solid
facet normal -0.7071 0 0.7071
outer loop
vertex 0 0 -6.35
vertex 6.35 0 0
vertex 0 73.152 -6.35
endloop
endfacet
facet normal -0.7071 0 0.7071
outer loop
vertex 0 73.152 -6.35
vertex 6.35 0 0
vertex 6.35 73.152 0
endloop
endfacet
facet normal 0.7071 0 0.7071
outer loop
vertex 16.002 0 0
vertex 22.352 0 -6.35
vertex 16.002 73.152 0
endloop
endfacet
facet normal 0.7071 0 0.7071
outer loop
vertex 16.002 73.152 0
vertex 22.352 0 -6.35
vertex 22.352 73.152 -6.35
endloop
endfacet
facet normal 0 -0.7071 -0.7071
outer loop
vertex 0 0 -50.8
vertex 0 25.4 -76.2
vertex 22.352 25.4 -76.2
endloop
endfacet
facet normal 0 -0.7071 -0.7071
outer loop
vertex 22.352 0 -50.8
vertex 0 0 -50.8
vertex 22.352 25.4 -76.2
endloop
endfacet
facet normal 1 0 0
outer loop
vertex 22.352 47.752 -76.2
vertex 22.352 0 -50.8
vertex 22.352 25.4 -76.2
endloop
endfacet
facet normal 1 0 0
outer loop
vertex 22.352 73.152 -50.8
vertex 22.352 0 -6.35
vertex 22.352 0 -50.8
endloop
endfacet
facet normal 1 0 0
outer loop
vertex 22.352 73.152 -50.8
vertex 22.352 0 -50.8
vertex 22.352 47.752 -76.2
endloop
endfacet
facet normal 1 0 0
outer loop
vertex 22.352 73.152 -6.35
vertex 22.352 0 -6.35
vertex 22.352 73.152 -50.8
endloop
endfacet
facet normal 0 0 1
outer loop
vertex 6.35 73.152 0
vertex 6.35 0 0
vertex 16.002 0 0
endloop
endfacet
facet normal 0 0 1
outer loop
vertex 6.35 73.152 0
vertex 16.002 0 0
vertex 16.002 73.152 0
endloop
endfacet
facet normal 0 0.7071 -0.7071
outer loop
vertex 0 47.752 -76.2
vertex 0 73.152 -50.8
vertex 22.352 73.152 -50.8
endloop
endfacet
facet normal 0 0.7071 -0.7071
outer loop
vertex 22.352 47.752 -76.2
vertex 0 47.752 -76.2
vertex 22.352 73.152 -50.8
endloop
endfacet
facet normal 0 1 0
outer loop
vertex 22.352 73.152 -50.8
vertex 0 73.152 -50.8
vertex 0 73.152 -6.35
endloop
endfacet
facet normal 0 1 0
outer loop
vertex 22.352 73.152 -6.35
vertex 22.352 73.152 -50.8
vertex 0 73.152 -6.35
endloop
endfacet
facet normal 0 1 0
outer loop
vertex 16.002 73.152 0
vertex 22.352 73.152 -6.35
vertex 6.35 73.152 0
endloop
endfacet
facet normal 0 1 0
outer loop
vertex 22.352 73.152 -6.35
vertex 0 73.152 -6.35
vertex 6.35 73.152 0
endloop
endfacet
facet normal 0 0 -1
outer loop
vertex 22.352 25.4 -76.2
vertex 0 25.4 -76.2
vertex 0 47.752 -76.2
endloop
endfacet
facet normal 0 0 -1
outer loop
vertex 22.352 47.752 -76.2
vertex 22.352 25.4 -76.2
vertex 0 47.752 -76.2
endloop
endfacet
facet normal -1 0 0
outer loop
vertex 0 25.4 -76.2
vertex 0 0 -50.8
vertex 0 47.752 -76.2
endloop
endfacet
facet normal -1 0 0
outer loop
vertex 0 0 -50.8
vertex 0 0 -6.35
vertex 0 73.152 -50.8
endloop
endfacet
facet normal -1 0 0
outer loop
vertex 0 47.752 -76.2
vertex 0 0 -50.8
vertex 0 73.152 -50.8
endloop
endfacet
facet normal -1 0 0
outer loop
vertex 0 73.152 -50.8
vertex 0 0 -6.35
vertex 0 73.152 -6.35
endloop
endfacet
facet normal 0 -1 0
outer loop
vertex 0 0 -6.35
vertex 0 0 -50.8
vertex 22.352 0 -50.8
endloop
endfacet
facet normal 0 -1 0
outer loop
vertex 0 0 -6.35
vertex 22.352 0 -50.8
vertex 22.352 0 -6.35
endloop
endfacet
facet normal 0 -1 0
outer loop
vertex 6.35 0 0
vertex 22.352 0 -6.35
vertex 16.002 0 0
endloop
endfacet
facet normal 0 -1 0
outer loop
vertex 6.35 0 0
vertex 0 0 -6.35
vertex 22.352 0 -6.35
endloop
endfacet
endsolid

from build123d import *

# Parameters (mm, degrees)
F0_W     = 73.152
F0_H     = 76.2
F1_DEPTH = 22.352
F2_SIZE  = 25.4
F3_SIZE  = 6.35


with BuildPart() as f1:
    # F0 (on Right) → F1 (new body)
    with BuildSketch(Plane.YZ):
        with Locations((36.576, -38.1)):
            Rectangle(F0_W, F0_H)
    extrude(amount=F1_DEPTH)

    # F2
    f2_edges = [f1.edges().sort_by_distance(p)[0] for p in [
        (11.176, 0, -76.2),
        (11.176, 73.152, -76.2),
    ]]
    chamfer(f2_edges, length=F2_SIZE)

    # F3
    f3_edges = [f1.edges().sort_by_distance(p)[0] for p in [
        (0, 36.576, 0),
        (22.352, 36.576, 0),
    ]]
    chamfer(f3_edges, length=F3_SIZE)


solid = f1.part
